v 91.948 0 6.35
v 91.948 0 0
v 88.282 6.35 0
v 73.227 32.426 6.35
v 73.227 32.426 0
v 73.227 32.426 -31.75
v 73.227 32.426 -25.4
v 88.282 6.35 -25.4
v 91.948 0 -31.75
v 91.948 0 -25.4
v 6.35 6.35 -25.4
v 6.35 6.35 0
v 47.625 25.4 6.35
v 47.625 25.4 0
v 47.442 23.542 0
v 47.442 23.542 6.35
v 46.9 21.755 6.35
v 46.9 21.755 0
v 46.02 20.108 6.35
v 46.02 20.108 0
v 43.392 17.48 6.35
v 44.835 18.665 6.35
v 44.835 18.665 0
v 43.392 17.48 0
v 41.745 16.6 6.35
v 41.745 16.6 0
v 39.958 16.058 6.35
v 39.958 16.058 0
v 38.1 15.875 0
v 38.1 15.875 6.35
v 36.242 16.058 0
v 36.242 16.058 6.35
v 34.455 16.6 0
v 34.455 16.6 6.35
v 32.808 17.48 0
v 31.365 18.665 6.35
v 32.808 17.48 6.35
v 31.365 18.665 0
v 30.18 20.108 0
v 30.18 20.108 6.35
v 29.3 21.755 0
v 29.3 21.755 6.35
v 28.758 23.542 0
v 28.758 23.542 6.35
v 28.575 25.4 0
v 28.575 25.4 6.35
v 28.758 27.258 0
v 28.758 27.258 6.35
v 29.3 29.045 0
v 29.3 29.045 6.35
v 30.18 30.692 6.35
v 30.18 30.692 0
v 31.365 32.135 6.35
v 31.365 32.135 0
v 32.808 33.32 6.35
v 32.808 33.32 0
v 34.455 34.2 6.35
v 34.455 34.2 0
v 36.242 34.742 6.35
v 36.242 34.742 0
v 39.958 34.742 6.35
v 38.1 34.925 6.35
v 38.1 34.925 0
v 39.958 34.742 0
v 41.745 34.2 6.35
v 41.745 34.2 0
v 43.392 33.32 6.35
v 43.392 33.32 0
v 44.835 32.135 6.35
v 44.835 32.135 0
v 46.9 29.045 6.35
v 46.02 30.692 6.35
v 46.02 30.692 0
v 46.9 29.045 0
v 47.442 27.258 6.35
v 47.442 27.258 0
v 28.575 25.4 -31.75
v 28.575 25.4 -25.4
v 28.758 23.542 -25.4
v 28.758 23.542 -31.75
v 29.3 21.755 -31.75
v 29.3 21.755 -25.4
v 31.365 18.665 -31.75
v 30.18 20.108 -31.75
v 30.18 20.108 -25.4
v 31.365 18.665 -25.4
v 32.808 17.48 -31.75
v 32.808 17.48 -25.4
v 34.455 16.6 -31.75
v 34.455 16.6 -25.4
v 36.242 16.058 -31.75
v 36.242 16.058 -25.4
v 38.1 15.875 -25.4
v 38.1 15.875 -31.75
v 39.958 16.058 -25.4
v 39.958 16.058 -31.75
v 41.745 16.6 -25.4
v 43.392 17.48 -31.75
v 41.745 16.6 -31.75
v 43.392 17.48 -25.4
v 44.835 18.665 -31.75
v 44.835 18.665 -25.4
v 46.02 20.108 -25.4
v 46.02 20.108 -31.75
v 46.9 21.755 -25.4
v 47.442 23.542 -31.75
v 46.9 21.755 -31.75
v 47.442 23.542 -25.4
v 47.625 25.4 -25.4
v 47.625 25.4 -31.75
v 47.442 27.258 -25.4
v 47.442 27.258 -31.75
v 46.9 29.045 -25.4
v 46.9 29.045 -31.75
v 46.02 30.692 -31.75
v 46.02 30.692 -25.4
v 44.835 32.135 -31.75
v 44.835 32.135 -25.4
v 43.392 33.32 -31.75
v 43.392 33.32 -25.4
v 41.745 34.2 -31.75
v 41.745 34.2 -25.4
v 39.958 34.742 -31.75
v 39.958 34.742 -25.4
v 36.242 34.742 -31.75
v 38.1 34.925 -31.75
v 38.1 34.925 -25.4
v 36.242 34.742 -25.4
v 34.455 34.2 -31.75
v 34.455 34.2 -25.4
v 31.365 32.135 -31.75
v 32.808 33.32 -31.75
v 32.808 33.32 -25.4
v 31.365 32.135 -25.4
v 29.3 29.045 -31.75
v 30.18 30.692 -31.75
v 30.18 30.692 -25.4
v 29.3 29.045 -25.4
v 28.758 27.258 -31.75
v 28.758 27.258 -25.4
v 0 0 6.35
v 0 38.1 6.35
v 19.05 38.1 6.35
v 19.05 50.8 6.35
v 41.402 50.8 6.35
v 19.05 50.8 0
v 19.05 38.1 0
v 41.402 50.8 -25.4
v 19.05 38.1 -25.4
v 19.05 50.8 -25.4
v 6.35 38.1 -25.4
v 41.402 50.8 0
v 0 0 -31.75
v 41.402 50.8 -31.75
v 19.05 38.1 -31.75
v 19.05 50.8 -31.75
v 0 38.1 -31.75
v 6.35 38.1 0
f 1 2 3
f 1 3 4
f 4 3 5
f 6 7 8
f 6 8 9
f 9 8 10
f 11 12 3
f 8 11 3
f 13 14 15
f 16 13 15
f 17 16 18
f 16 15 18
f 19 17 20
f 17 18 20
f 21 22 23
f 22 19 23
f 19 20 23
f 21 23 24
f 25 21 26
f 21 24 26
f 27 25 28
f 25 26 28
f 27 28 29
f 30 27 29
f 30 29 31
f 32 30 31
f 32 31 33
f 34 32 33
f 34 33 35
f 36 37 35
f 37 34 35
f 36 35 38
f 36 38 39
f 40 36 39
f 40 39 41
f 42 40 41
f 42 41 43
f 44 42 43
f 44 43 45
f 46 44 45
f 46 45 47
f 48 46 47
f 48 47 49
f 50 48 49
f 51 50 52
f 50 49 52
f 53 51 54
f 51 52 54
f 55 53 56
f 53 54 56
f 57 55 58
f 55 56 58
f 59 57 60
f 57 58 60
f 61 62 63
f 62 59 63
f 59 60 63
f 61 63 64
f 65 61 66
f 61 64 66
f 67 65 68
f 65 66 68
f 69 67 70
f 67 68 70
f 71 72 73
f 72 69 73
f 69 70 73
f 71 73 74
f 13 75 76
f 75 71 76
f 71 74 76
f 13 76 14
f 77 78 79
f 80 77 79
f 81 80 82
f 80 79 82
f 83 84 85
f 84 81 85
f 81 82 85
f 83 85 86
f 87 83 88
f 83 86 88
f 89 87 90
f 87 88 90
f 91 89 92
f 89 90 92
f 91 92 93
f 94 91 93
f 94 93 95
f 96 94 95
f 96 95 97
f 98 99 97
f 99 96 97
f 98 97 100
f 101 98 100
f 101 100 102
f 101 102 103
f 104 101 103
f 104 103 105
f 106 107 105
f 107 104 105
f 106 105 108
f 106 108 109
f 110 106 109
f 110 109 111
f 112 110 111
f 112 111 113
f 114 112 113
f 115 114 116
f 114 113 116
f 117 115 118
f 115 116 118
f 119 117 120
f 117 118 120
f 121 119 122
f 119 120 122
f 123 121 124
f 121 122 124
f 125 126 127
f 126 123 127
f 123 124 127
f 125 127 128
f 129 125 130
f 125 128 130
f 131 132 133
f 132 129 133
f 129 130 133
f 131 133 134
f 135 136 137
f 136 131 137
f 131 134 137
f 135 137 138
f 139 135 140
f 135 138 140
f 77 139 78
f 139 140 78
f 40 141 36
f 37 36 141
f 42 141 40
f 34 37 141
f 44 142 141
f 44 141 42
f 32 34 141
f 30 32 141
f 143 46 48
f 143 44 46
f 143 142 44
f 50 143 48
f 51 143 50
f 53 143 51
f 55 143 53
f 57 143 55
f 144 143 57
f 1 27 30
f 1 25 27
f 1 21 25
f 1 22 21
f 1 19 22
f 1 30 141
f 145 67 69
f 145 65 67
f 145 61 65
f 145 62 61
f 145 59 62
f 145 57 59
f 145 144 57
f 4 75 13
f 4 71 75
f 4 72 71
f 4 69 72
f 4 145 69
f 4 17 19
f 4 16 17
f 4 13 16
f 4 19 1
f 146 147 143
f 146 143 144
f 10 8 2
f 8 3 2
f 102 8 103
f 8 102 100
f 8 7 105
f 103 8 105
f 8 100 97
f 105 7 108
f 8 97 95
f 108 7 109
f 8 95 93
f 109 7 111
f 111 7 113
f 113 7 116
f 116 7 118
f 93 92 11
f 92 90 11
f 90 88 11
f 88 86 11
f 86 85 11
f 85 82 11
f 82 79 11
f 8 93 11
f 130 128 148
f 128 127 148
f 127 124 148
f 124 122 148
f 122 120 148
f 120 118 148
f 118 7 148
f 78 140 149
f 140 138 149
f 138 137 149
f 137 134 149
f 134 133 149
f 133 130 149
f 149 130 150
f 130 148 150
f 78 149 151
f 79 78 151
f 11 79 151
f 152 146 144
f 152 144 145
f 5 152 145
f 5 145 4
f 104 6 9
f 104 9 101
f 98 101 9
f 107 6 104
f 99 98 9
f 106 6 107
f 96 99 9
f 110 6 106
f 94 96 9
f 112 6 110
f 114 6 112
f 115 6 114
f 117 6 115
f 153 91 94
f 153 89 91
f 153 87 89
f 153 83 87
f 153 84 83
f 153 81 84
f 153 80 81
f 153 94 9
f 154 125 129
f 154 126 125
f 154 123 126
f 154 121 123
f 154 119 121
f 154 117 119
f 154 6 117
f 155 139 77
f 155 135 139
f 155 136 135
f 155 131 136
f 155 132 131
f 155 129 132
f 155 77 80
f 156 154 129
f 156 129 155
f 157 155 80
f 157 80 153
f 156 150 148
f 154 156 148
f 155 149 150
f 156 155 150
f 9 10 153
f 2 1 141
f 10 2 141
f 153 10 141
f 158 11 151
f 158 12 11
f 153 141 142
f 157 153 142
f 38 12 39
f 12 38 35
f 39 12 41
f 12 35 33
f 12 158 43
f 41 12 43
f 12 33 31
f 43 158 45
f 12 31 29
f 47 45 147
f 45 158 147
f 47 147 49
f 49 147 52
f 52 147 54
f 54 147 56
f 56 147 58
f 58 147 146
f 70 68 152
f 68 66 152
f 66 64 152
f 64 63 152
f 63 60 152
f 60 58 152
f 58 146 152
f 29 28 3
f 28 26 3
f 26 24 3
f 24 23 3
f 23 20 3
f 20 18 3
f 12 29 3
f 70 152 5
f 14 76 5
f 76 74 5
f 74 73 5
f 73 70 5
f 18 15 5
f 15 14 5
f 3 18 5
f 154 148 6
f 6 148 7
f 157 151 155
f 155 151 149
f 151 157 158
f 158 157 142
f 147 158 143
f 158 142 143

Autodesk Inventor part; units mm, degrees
ref_plane "YZ Plane" through (0, 0, 0) normal (1, 0, 0) x (0, 1, 0)
ref_plane "XZ Plane" through (0, 0, 0) normal (0, 1, 0) x (-1, 0, 0)
ref_plane "XY Plane" through (0, 0, 0) normal (0, 0, 1) x (1, 0, 0)
sketch "Sketch1" plane through (0, 0, 0) normal (0, 0, 1) x (1, 0, 0)
  line L0 (0, 0) -> (91.948, 0)
  line L1 (0, 0) -> (0, 38.1)
  line L2 (0, 38.1) -> (19.05, 38.1)
  line L3 (19.05, 38.1) -> (19.05, 50.8)
  line L4 (19.05, 50.8) -> (41.402, 50.8)
  line L5 (91.948, 0) -> (223.0777, 0) construction
  line L6 (41.402, 50.8) -> (73.2269, 32.4259)
  line L7 (91.948, 0) -> (73.2269, 32.4259)
  circle A0 centre (38.1, 25.4) radius 9.525
  dimension "d3" = 12.7
  dimension "d7" = 19.05
  dimension "d8" = 50.8
  dimension "d9" = 41.402
  dimension "d10" = 60
  dimension "d11" = 30
  dimension "d12" = 19.05
  dimension "d13" = 38.1
  dimension "d14" = 25.4
extrude "Extrusion1" add sketch "Sketch1" along normal blind 6.35
sketch "Sketch2" plane through (0, 0, 0) normal (0, 0, -1) x (-1, 0, 0)
  line L0 (-19.05, 38.1) -> (0, 38.1) projected
  line L1 (0, 0) -> (-6.35, 0)
  line L2 (-6.35, 0) -> (-6.35, 38.1)
  line L3 (-6.35, 38.1) -> (0, 38.1)
  line L4 (0, 38.1) -> (0, 0)
  dimension "d17" = 6.35
extrude "Extrusion2" add sketch "Sketch2" along normal blind 25.4
sketch "Sketch3" plane through (0, 0, 0) normal (0, 0, -1) x (-1, 0, 0)
  point P0 (0, 0)
sketch "Sketch4" plane through (0, 0, 0) normal (0, 0, -1) x (-1, 0, 0)
  line L0 (-6.35, 0) -> (-6.35, 6.35)
  line L1 (-6.35, 0) -> (-6.35, 38.1) projected
  line L2 (-6.35, 6.35) -> (-88.2818, 6.35)
  line L3 (-88.2818, 6.35) -> (-91.948, 0)
  line L4 (-91.948, 0) -> (-73.2269, 32.4259) projected
  line L5 (-91.948, 0) -> (-6.35, 0)
  line L6 (0, 0) -> (-91.948, 0) projected
  dimension "d21" = 6.35
extrude "Extrusion3" add sketch "Sketch4" along normal blind 25.4
sketch "Sketch5" plane through (0, 0, -25.4) normal (0, 0, -1) x (-1, 0, 0)
  point P0 (0, 0)
sketch "Sketch6" plane through (0, 0, -25.4) normal (0, 0, -1) x (-1, 0, 0)
  line L0 (0, 0) -> (0, 38.1)
  line L1 (0, 38.1) -> (-19.05, 38.1)
  line L2 (-19.05, 38.1) -> (-19.05, 50.8)
  line L3 (-19.05, 50.8) -> (-41.402, 50.8)
  line L4 (-41.402, 50.8) -> (-73.2269, 32.4259)
  line L5 (-73.2269, 32.4259) -> (-91.948, 0)
  line L6 (-91.948, 0) -> (0, 0)
  line L7 (0, 0) -> (-91.948, 0) projected
  circle A0 centre (-38.1, 25.4) radius 9.525
  dimension "d24" = 19.05
  dimension "d25" = 38.1
  dimension "d26" = 25.4
extrude "Extrusion4" add sketch "Sketch6" along normal blind 6.35
properties part number "2.4 Tutorial"
